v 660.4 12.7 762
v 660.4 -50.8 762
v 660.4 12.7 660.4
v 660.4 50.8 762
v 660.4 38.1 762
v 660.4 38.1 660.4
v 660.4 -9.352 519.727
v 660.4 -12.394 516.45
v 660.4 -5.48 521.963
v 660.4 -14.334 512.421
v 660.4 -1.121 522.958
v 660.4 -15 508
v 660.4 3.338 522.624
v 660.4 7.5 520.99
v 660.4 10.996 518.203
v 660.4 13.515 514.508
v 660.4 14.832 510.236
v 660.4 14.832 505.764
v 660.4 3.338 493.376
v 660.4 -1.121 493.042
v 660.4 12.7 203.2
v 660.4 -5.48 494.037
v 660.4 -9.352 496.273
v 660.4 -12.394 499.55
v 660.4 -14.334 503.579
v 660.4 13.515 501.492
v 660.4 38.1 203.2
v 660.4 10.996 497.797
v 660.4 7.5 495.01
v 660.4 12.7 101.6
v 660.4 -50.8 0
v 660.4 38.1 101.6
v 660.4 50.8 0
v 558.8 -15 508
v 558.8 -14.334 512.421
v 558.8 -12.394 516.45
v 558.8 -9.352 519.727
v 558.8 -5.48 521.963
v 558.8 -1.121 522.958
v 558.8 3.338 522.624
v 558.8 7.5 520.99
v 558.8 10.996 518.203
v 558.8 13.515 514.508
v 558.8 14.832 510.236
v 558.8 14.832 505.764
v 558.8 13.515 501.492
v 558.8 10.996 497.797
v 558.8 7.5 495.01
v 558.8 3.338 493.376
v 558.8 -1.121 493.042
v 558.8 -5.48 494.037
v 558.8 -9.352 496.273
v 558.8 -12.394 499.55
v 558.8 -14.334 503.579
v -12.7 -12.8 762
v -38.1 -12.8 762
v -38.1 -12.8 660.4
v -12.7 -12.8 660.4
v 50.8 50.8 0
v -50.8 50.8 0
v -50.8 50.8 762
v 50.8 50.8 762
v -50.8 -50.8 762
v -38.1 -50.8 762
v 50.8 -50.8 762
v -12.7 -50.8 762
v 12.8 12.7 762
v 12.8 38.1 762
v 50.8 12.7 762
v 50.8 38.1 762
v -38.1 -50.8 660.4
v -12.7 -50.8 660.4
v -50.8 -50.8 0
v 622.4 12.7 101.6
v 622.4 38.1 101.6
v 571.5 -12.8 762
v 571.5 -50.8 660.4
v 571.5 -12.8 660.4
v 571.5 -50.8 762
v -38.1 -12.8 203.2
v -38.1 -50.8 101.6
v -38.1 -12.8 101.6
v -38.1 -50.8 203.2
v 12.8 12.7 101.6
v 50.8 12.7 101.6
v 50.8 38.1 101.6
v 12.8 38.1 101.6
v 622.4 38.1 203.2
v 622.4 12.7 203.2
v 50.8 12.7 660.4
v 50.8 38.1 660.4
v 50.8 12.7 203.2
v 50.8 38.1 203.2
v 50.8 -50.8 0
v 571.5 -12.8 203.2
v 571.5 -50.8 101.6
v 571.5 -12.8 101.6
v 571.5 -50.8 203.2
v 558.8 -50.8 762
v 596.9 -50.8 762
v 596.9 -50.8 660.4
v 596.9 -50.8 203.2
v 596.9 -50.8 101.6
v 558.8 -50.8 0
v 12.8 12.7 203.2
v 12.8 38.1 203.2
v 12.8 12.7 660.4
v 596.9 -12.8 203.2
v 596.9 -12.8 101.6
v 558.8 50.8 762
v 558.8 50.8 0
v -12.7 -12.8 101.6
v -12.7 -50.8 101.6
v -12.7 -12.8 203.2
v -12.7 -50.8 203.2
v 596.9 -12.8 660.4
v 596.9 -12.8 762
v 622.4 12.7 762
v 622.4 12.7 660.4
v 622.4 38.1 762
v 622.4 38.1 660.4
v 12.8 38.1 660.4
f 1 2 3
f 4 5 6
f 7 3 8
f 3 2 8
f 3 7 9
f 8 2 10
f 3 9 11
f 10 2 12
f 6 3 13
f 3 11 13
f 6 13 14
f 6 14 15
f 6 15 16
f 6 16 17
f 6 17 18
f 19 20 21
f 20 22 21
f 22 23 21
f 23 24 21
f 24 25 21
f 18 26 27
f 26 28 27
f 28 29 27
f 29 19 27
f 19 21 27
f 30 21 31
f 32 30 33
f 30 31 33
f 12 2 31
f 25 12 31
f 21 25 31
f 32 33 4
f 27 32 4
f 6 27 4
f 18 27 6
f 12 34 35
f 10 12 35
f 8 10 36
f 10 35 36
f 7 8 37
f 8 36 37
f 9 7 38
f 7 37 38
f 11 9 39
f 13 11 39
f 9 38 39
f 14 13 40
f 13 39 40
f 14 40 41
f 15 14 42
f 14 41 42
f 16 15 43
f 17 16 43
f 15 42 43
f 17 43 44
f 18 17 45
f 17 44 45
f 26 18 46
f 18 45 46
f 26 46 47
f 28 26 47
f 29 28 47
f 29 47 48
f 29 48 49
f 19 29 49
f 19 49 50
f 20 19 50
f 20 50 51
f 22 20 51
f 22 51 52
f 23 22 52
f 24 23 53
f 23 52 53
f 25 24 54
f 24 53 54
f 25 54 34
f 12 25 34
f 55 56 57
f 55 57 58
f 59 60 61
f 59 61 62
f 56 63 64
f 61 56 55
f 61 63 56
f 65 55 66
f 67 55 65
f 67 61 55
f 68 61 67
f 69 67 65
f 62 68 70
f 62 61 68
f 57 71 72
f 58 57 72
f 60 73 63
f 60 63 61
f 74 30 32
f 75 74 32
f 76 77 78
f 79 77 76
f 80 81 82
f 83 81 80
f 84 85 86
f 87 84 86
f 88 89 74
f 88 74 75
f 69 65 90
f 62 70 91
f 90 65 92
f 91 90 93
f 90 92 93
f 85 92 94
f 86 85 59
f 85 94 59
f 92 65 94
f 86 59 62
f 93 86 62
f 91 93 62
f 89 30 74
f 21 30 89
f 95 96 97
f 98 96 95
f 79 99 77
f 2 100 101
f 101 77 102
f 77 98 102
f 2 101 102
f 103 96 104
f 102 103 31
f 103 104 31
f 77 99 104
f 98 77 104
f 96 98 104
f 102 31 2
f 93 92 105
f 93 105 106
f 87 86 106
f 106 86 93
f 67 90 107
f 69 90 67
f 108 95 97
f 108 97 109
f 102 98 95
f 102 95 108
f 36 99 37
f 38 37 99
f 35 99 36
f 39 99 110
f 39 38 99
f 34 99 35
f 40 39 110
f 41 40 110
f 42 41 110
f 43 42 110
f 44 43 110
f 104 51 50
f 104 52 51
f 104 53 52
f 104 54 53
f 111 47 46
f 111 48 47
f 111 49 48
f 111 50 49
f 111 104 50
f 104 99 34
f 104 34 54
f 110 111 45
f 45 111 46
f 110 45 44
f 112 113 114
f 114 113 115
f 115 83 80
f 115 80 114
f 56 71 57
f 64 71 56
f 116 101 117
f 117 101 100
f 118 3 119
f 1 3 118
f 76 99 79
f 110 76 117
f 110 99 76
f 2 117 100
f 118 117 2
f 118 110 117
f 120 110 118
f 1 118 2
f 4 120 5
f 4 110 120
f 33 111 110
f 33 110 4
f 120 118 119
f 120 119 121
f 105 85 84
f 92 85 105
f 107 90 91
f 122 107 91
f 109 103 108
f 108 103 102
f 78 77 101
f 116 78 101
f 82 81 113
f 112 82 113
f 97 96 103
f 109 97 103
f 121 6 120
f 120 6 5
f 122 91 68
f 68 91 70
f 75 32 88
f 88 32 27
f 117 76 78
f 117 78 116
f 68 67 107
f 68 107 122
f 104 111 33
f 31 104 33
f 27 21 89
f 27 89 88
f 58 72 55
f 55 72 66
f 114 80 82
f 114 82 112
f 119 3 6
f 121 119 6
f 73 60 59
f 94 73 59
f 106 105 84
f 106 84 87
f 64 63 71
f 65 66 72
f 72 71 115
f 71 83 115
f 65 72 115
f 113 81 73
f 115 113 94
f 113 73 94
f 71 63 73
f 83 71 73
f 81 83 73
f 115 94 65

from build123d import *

# Parameters (mm, degrees)
F0_W     = 101.6
F0_H     = 101.6
F1_DEPTH = 762
F2_W     = 25.4
F2_H     = 101.6
F3_DEPTH = 38
F4_W     = 25.4
F4_H     = 101.6
F5_DEPTH = 38
F7_R     = 15
F8_DEPTH = 101.6


with BuildPart() as f1:
    # F0 (on Top) → F1 (new body)
    with BuildSketch(Plane.XY):
        Rectangle(F0_W, F0_H)
    extrude(amount=F1_DEPTH)

    # F2 (on face) → F3 (cut)
    with BuildSketch(Plane.XZ.offset(50.8)):
        with Locations((-25.4, 152.4)):
            Rectangle(F2_W, F2_H)
        with Locations((-25.4, 711.2)):
            Rectangle(F2_W, F2_H)
    extrude(amount=-F3_DEPTH, mode=Mode.SUBTRACT)

    # F4 (on face) → F5 (cut)
    with BuildSketch(Plane.YZ.offset(50.8)):
        with Locations((25.4, 152.4)):
            Rectangle(F4_W, F4_H)
        with Locations((25.4, 711.2)):
            Rectangle(F4_W, F4_H)
    extrude(amount=-F5_DEPTH, mode=Mode.SUBTRACT)


with BuildPart() as f6_1:
    # F6: copy of F1
    add(f1.part.moved(Location((609.6, 0, 0))))

    # F7 (on face) → F8 (cut, through all)
    with BuildSketch(Plane(origin=(558.8, 0, 0), x_dir=(0, -1, 0), z_dir=(-1, 0, 0))):
        with Locations((0, 508)):
            Circle(F7_R)
    extrude(amount=-F8_DEPTH, mode=Mode.SUBTRACT)


solid = Compound([f1.part, f6_1.part])
